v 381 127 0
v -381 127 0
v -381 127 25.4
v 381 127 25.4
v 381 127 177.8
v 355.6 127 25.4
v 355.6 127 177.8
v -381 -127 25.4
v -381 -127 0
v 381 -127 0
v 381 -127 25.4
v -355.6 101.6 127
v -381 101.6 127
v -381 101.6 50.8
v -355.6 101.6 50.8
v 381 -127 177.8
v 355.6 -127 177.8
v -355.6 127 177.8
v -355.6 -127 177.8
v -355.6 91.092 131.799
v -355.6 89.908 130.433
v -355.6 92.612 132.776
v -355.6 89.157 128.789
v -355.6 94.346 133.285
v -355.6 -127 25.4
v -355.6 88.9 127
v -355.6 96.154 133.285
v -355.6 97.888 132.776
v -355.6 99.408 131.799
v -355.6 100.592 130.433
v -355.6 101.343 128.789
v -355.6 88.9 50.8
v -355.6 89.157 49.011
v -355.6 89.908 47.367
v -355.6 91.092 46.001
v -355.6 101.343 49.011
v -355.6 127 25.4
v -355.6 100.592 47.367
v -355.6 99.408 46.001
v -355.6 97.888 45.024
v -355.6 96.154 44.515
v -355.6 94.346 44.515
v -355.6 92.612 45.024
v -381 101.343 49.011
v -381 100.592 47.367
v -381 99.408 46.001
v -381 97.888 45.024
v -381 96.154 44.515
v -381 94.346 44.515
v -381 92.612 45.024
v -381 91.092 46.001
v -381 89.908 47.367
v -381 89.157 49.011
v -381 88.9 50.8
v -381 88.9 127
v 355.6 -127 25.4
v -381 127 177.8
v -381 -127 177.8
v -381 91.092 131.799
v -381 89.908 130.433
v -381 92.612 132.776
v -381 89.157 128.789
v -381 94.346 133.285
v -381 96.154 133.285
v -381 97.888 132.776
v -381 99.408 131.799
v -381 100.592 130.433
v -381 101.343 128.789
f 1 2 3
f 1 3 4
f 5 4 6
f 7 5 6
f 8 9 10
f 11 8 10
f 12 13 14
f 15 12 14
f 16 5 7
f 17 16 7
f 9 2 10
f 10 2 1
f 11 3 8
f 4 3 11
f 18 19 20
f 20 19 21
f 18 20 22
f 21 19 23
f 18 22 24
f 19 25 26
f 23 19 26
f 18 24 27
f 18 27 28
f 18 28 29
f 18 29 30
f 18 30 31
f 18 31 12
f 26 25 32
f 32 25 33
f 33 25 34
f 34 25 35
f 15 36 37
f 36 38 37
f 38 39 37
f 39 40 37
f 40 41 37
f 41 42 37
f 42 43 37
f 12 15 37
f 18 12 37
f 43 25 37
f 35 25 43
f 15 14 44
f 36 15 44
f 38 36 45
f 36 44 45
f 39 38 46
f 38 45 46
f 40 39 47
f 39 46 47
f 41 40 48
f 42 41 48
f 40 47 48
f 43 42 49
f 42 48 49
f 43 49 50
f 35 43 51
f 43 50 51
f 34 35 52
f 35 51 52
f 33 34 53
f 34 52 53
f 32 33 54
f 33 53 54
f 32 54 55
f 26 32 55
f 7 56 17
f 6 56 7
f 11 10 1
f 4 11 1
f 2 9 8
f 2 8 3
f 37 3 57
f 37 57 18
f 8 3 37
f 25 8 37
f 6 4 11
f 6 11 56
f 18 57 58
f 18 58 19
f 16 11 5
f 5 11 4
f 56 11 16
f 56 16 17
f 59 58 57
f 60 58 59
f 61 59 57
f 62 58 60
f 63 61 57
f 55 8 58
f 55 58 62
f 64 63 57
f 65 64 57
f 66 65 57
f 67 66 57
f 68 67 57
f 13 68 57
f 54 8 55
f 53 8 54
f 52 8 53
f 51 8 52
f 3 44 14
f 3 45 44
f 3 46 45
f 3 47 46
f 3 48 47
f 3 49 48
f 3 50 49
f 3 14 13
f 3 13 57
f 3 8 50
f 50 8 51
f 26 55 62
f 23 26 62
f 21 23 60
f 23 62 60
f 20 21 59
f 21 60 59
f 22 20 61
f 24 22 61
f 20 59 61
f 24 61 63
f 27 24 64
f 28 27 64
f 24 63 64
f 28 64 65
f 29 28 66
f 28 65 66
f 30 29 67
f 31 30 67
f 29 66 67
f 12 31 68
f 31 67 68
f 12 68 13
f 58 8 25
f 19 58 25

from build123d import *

# Parameters (mm, degrees)
F0_W     = 762
F0_H     = 254
F1_DEPTH = 25.4
F2_W     = 25.4
F2_H     = 254
F3_DEPTH = 152.4
F7_DEPTH = 25.4


with BuildPart() as f1:
    # F0 (on Top) → F1 (new body)
    with BuildSketch(Plane.XY):
        Rectangle(F0_W, F0_H)
    extrude(amount=F1_DEPTH)


with BuildPart() as f3:
    # F2 (on face) → F3 (new body)
    with BuildSketch(Plane.XY.offset(25.4)):
        with Locations((-368.3, 0)):
            Rectangle(F2_W, F2_H)
    extrude(amount=F3_DEPTH)


with BuildPart() as f4_1:
    # F4: instance of F3
    add(f3.part.mirror(Plane.YZ))


with BuildPart() as f3_1:
    add(f3.part)

    # F6 (on face) → F7 (cut)
    with BuildSketch(Plane(origin=(-381, 0, 0), x_dir=(0, -1, 0), z_dir=(-1, 0, 0))):
        with BuildLine():
            ThreePointArc((-88.9, 127), (-95.25, 133.35), (-101.6, 127))
            Line((-101.6, 127), (-101.6, 50.8))
            ThreePointArc((-101.6, 50.8), (-95.25, 44.45), (-88.9, 50.8))
            Line((-88.9, 50.8), (-88.9, 127))
        make_face()
    extrude(amount=-F7_DEPTH, mode=Mode.SUBTRACT)


solid = Compound([f1.part, f4_1.part, f3_1.part])
